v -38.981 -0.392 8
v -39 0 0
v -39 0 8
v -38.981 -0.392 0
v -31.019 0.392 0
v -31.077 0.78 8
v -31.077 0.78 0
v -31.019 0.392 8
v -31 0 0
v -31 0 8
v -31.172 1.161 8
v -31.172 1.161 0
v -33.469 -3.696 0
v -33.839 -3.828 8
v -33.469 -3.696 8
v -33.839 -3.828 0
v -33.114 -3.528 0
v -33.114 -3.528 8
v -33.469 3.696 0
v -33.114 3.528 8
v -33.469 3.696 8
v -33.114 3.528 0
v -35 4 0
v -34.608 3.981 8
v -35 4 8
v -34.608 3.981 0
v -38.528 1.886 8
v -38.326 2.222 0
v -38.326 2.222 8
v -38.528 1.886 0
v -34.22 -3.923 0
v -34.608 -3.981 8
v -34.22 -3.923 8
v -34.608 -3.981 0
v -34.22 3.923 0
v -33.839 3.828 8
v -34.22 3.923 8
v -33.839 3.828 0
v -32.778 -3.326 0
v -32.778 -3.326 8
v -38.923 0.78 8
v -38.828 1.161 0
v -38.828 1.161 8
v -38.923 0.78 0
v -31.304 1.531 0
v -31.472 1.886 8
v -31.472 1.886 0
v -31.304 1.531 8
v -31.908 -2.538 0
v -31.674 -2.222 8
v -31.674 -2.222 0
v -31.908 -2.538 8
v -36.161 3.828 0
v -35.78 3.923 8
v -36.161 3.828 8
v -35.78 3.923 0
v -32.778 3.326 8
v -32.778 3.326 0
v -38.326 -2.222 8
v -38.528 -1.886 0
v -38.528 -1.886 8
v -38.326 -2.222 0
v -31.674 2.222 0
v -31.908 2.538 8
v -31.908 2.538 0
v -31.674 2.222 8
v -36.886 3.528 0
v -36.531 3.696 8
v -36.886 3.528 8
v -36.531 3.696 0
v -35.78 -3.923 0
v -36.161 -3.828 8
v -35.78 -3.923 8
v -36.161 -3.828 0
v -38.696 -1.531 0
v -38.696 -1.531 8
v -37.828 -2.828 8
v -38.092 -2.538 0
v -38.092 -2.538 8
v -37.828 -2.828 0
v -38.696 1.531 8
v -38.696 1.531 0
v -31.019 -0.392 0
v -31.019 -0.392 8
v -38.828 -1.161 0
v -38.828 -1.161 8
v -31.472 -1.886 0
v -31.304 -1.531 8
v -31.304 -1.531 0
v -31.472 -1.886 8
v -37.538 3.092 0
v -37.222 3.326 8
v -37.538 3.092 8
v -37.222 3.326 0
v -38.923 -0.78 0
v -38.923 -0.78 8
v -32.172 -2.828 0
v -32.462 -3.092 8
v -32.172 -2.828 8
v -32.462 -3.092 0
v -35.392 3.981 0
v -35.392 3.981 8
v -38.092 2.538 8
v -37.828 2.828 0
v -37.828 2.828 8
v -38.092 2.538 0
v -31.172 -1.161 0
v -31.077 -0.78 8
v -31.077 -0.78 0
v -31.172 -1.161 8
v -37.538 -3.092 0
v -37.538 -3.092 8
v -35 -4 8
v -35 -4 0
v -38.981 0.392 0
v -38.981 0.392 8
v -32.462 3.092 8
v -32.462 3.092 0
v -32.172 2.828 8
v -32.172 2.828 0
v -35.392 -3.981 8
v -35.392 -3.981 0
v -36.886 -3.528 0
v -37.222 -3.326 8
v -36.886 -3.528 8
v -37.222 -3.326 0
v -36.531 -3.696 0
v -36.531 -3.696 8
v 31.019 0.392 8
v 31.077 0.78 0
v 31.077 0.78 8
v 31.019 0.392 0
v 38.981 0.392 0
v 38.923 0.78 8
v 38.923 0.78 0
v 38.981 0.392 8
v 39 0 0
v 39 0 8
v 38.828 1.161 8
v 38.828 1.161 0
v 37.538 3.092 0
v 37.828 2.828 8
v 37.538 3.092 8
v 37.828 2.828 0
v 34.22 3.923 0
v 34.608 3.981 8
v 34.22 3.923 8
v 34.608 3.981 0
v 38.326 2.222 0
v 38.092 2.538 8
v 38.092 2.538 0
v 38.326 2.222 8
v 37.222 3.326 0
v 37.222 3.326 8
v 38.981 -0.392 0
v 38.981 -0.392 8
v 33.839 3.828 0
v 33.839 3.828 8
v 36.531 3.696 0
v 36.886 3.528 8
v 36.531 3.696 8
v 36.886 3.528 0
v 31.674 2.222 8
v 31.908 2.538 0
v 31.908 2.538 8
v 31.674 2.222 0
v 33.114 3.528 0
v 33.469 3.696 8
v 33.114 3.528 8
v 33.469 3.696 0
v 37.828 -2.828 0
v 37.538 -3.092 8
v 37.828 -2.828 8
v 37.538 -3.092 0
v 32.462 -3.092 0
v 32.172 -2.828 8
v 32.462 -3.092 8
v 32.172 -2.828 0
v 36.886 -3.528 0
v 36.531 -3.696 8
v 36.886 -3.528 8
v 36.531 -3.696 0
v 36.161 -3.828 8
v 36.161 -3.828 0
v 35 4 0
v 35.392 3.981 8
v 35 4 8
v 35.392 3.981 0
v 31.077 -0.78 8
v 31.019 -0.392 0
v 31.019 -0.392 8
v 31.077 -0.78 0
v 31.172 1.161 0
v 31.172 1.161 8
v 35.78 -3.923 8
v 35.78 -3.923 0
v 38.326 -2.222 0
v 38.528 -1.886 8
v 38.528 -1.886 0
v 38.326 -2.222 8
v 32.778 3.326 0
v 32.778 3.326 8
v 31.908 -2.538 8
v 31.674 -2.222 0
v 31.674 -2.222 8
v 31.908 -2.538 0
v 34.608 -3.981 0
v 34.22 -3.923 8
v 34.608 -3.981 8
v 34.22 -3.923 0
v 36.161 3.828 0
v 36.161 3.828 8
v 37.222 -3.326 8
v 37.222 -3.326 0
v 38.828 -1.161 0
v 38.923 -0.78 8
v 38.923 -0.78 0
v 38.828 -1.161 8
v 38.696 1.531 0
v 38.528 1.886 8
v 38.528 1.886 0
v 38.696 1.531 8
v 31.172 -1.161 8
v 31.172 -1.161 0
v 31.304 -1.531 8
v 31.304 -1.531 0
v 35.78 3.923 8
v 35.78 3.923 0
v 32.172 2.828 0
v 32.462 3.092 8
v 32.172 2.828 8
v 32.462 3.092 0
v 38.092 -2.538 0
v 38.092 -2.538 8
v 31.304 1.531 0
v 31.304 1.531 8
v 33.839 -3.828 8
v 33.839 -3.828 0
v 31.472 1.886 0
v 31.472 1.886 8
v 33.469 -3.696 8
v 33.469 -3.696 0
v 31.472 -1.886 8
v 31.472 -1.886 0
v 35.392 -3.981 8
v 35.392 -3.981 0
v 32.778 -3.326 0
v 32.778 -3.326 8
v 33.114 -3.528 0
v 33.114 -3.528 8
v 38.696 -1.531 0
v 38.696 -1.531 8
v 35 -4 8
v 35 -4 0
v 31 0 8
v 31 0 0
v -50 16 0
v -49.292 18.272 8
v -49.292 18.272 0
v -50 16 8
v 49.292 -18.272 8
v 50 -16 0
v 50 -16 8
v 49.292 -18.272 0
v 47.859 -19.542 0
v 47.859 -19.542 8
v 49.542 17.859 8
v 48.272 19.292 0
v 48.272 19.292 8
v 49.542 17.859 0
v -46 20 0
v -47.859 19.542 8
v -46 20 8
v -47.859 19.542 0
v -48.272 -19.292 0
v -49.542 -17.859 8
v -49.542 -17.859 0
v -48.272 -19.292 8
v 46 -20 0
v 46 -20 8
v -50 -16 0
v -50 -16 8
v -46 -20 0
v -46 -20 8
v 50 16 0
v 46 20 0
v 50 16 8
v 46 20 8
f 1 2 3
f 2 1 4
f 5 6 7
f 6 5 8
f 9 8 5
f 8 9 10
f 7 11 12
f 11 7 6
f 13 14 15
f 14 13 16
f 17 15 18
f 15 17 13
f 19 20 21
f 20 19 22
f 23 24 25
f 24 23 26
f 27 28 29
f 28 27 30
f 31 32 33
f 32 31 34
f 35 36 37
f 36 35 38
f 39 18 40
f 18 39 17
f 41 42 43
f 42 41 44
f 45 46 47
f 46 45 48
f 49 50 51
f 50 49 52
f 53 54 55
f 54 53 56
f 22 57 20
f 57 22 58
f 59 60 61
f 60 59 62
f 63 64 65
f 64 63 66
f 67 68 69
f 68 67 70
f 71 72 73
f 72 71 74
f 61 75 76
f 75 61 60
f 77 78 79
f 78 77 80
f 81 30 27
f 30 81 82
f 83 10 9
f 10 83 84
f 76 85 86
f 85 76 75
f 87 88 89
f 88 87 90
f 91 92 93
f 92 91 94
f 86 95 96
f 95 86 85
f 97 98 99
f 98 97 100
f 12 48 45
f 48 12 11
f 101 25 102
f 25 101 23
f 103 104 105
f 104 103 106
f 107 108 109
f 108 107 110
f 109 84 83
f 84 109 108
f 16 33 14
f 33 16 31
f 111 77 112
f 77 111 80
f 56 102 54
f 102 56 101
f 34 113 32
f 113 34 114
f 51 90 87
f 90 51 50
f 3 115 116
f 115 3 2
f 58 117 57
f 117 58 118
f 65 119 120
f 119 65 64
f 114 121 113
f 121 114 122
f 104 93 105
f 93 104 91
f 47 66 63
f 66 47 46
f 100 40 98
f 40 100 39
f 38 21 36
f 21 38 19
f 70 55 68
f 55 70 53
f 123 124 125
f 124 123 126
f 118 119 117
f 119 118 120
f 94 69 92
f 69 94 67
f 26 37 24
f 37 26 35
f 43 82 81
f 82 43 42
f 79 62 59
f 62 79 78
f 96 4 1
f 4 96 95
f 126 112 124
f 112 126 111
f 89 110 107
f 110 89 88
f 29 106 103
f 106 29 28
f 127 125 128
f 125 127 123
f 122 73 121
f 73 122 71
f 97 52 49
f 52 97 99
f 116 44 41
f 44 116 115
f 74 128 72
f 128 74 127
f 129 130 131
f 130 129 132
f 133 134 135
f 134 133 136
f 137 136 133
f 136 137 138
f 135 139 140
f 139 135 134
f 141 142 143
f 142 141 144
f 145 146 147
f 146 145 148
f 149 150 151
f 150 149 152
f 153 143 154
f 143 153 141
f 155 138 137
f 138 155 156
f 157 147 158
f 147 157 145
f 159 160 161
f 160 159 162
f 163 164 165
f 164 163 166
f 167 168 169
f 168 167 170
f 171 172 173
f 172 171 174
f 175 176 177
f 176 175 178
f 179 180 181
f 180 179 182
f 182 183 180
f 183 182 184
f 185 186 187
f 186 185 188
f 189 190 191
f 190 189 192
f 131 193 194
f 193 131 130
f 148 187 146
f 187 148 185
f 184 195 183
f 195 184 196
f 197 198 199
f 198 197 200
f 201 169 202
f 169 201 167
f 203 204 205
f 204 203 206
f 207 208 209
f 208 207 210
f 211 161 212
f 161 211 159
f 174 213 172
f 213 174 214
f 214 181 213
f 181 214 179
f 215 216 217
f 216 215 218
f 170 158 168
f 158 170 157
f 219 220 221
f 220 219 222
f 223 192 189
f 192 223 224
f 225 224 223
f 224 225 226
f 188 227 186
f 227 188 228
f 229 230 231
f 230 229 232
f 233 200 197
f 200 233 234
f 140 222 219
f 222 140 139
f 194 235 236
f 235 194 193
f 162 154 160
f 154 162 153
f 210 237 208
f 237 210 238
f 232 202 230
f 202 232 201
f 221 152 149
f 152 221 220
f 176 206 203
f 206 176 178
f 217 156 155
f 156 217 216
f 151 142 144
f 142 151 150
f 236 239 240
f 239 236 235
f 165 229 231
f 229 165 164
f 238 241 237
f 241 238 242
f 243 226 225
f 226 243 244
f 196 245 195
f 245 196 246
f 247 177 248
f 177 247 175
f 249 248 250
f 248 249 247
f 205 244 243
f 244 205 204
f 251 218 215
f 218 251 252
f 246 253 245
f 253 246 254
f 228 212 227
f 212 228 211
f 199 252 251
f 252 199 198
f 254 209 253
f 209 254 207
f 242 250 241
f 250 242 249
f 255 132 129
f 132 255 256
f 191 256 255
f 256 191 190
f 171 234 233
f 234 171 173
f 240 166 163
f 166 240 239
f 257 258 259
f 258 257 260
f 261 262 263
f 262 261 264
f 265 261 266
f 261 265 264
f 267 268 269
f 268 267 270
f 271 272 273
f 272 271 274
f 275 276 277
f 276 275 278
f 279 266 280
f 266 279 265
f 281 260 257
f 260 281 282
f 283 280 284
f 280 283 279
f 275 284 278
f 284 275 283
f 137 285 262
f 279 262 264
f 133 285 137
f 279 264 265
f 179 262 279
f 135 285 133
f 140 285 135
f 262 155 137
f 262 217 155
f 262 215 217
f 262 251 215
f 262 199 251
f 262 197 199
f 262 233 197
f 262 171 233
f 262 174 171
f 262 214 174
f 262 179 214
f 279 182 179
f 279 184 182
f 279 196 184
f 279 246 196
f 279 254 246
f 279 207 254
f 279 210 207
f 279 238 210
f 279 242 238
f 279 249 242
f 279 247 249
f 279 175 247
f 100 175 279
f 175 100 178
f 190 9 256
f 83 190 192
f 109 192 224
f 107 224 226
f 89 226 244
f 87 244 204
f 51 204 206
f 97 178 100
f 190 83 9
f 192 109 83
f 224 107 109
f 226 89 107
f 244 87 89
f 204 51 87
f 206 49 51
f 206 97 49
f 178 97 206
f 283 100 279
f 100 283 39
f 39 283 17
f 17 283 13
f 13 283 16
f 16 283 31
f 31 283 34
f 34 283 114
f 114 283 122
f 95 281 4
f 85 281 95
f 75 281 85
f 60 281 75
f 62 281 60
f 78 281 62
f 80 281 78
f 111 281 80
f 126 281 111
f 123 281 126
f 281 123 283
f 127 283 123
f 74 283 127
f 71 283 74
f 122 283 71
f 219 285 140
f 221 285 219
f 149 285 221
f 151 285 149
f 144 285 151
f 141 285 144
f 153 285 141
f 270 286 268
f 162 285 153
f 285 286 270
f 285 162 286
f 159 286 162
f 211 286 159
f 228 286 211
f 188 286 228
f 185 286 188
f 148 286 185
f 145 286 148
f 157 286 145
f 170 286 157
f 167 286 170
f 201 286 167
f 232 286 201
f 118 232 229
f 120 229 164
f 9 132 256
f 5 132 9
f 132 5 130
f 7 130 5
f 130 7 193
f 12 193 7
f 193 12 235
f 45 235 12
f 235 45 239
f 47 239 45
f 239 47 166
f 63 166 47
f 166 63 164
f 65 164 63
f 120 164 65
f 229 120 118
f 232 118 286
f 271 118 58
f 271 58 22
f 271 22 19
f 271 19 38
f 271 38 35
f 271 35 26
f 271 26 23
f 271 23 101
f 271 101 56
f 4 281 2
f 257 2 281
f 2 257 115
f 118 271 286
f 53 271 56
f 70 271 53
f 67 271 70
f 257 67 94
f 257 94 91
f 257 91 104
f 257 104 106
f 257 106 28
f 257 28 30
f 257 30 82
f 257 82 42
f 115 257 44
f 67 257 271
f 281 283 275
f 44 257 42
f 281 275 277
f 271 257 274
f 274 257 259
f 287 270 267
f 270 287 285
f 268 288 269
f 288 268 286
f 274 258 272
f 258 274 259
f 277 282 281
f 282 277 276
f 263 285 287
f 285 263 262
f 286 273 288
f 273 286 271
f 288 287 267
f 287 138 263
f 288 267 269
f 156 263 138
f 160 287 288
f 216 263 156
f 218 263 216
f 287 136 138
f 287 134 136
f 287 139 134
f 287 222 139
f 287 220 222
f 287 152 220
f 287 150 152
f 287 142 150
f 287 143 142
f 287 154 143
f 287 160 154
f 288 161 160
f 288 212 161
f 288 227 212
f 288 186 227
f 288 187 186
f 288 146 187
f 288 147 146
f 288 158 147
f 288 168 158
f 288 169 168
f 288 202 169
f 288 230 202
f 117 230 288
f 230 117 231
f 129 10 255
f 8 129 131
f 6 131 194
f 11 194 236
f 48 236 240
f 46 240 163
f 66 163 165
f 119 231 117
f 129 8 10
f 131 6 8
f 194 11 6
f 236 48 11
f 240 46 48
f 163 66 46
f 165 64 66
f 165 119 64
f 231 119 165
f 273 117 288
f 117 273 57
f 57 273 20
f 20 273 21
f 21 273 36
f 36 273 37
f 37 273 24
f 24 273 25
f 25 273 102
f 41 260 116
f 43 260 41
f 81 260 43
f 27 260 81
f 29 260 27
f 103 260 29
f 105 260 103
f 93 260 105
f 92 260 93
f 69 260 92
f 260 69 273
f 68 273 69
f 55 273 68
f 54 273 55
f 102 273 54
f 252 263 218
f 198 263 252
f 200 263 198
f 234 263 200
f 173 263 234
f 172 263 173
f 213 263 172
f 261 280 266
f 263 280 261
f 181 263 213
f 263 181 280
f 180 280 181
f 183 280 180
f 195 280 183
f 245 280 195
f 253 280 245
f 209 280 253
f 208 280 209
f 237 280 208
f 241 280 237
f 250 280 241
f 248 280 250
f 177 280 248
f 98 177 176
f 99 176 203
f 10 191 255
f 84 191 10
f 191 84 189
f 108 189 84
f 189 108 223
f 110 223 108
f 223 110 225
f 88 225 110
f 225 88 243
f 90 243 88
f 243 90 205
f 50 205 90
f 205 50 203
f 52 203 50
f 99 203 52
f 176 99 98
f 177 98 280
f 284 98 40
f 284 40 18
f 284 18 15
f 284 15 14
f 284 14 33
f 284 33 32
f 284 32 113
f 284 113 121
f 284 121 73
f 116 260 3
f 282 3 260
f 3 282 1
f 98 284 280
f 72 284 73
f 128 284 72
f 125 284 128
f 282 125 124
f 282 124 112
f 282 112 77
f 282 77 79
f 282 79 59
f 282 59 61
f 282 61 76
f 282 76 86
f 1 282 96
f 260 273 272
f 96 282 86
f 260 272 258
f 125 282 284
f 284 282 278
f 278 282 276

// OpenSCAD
// Parametric Mounting Bracket
// Designed for AI-training CAD benchmark tasks

bracket_length = 100;
bracket_width = 40;
bracket_thickness = 8;
hole_diameter = 8;
hole_spacing = 70;
corner_radius = 4;

module rounded_plate(length, width, thickness, radius) {
    linear_extrude(height = thickness)
        offset(r = radius)
            offset(delta = -radius)
                square([length, width], center = true);
}

module mounting_holes(spacing, diameter, thickness) {
    translate([-spacing / 2, 0, -1])
        cylinder(h = thickness + 2, d = diameter, $fn = 64);

    translate([spacing / 2, 0, -1])
        cylinder(h = thickness + 2, d = diameter, $fn = 64);
}

difference() {
    rounded_plate(bracket_length, bracket_width, bracket_thickness, corner_radius);
    mounting_holes(hole_spacing, hole_diameter, bracket_thickness);
}
